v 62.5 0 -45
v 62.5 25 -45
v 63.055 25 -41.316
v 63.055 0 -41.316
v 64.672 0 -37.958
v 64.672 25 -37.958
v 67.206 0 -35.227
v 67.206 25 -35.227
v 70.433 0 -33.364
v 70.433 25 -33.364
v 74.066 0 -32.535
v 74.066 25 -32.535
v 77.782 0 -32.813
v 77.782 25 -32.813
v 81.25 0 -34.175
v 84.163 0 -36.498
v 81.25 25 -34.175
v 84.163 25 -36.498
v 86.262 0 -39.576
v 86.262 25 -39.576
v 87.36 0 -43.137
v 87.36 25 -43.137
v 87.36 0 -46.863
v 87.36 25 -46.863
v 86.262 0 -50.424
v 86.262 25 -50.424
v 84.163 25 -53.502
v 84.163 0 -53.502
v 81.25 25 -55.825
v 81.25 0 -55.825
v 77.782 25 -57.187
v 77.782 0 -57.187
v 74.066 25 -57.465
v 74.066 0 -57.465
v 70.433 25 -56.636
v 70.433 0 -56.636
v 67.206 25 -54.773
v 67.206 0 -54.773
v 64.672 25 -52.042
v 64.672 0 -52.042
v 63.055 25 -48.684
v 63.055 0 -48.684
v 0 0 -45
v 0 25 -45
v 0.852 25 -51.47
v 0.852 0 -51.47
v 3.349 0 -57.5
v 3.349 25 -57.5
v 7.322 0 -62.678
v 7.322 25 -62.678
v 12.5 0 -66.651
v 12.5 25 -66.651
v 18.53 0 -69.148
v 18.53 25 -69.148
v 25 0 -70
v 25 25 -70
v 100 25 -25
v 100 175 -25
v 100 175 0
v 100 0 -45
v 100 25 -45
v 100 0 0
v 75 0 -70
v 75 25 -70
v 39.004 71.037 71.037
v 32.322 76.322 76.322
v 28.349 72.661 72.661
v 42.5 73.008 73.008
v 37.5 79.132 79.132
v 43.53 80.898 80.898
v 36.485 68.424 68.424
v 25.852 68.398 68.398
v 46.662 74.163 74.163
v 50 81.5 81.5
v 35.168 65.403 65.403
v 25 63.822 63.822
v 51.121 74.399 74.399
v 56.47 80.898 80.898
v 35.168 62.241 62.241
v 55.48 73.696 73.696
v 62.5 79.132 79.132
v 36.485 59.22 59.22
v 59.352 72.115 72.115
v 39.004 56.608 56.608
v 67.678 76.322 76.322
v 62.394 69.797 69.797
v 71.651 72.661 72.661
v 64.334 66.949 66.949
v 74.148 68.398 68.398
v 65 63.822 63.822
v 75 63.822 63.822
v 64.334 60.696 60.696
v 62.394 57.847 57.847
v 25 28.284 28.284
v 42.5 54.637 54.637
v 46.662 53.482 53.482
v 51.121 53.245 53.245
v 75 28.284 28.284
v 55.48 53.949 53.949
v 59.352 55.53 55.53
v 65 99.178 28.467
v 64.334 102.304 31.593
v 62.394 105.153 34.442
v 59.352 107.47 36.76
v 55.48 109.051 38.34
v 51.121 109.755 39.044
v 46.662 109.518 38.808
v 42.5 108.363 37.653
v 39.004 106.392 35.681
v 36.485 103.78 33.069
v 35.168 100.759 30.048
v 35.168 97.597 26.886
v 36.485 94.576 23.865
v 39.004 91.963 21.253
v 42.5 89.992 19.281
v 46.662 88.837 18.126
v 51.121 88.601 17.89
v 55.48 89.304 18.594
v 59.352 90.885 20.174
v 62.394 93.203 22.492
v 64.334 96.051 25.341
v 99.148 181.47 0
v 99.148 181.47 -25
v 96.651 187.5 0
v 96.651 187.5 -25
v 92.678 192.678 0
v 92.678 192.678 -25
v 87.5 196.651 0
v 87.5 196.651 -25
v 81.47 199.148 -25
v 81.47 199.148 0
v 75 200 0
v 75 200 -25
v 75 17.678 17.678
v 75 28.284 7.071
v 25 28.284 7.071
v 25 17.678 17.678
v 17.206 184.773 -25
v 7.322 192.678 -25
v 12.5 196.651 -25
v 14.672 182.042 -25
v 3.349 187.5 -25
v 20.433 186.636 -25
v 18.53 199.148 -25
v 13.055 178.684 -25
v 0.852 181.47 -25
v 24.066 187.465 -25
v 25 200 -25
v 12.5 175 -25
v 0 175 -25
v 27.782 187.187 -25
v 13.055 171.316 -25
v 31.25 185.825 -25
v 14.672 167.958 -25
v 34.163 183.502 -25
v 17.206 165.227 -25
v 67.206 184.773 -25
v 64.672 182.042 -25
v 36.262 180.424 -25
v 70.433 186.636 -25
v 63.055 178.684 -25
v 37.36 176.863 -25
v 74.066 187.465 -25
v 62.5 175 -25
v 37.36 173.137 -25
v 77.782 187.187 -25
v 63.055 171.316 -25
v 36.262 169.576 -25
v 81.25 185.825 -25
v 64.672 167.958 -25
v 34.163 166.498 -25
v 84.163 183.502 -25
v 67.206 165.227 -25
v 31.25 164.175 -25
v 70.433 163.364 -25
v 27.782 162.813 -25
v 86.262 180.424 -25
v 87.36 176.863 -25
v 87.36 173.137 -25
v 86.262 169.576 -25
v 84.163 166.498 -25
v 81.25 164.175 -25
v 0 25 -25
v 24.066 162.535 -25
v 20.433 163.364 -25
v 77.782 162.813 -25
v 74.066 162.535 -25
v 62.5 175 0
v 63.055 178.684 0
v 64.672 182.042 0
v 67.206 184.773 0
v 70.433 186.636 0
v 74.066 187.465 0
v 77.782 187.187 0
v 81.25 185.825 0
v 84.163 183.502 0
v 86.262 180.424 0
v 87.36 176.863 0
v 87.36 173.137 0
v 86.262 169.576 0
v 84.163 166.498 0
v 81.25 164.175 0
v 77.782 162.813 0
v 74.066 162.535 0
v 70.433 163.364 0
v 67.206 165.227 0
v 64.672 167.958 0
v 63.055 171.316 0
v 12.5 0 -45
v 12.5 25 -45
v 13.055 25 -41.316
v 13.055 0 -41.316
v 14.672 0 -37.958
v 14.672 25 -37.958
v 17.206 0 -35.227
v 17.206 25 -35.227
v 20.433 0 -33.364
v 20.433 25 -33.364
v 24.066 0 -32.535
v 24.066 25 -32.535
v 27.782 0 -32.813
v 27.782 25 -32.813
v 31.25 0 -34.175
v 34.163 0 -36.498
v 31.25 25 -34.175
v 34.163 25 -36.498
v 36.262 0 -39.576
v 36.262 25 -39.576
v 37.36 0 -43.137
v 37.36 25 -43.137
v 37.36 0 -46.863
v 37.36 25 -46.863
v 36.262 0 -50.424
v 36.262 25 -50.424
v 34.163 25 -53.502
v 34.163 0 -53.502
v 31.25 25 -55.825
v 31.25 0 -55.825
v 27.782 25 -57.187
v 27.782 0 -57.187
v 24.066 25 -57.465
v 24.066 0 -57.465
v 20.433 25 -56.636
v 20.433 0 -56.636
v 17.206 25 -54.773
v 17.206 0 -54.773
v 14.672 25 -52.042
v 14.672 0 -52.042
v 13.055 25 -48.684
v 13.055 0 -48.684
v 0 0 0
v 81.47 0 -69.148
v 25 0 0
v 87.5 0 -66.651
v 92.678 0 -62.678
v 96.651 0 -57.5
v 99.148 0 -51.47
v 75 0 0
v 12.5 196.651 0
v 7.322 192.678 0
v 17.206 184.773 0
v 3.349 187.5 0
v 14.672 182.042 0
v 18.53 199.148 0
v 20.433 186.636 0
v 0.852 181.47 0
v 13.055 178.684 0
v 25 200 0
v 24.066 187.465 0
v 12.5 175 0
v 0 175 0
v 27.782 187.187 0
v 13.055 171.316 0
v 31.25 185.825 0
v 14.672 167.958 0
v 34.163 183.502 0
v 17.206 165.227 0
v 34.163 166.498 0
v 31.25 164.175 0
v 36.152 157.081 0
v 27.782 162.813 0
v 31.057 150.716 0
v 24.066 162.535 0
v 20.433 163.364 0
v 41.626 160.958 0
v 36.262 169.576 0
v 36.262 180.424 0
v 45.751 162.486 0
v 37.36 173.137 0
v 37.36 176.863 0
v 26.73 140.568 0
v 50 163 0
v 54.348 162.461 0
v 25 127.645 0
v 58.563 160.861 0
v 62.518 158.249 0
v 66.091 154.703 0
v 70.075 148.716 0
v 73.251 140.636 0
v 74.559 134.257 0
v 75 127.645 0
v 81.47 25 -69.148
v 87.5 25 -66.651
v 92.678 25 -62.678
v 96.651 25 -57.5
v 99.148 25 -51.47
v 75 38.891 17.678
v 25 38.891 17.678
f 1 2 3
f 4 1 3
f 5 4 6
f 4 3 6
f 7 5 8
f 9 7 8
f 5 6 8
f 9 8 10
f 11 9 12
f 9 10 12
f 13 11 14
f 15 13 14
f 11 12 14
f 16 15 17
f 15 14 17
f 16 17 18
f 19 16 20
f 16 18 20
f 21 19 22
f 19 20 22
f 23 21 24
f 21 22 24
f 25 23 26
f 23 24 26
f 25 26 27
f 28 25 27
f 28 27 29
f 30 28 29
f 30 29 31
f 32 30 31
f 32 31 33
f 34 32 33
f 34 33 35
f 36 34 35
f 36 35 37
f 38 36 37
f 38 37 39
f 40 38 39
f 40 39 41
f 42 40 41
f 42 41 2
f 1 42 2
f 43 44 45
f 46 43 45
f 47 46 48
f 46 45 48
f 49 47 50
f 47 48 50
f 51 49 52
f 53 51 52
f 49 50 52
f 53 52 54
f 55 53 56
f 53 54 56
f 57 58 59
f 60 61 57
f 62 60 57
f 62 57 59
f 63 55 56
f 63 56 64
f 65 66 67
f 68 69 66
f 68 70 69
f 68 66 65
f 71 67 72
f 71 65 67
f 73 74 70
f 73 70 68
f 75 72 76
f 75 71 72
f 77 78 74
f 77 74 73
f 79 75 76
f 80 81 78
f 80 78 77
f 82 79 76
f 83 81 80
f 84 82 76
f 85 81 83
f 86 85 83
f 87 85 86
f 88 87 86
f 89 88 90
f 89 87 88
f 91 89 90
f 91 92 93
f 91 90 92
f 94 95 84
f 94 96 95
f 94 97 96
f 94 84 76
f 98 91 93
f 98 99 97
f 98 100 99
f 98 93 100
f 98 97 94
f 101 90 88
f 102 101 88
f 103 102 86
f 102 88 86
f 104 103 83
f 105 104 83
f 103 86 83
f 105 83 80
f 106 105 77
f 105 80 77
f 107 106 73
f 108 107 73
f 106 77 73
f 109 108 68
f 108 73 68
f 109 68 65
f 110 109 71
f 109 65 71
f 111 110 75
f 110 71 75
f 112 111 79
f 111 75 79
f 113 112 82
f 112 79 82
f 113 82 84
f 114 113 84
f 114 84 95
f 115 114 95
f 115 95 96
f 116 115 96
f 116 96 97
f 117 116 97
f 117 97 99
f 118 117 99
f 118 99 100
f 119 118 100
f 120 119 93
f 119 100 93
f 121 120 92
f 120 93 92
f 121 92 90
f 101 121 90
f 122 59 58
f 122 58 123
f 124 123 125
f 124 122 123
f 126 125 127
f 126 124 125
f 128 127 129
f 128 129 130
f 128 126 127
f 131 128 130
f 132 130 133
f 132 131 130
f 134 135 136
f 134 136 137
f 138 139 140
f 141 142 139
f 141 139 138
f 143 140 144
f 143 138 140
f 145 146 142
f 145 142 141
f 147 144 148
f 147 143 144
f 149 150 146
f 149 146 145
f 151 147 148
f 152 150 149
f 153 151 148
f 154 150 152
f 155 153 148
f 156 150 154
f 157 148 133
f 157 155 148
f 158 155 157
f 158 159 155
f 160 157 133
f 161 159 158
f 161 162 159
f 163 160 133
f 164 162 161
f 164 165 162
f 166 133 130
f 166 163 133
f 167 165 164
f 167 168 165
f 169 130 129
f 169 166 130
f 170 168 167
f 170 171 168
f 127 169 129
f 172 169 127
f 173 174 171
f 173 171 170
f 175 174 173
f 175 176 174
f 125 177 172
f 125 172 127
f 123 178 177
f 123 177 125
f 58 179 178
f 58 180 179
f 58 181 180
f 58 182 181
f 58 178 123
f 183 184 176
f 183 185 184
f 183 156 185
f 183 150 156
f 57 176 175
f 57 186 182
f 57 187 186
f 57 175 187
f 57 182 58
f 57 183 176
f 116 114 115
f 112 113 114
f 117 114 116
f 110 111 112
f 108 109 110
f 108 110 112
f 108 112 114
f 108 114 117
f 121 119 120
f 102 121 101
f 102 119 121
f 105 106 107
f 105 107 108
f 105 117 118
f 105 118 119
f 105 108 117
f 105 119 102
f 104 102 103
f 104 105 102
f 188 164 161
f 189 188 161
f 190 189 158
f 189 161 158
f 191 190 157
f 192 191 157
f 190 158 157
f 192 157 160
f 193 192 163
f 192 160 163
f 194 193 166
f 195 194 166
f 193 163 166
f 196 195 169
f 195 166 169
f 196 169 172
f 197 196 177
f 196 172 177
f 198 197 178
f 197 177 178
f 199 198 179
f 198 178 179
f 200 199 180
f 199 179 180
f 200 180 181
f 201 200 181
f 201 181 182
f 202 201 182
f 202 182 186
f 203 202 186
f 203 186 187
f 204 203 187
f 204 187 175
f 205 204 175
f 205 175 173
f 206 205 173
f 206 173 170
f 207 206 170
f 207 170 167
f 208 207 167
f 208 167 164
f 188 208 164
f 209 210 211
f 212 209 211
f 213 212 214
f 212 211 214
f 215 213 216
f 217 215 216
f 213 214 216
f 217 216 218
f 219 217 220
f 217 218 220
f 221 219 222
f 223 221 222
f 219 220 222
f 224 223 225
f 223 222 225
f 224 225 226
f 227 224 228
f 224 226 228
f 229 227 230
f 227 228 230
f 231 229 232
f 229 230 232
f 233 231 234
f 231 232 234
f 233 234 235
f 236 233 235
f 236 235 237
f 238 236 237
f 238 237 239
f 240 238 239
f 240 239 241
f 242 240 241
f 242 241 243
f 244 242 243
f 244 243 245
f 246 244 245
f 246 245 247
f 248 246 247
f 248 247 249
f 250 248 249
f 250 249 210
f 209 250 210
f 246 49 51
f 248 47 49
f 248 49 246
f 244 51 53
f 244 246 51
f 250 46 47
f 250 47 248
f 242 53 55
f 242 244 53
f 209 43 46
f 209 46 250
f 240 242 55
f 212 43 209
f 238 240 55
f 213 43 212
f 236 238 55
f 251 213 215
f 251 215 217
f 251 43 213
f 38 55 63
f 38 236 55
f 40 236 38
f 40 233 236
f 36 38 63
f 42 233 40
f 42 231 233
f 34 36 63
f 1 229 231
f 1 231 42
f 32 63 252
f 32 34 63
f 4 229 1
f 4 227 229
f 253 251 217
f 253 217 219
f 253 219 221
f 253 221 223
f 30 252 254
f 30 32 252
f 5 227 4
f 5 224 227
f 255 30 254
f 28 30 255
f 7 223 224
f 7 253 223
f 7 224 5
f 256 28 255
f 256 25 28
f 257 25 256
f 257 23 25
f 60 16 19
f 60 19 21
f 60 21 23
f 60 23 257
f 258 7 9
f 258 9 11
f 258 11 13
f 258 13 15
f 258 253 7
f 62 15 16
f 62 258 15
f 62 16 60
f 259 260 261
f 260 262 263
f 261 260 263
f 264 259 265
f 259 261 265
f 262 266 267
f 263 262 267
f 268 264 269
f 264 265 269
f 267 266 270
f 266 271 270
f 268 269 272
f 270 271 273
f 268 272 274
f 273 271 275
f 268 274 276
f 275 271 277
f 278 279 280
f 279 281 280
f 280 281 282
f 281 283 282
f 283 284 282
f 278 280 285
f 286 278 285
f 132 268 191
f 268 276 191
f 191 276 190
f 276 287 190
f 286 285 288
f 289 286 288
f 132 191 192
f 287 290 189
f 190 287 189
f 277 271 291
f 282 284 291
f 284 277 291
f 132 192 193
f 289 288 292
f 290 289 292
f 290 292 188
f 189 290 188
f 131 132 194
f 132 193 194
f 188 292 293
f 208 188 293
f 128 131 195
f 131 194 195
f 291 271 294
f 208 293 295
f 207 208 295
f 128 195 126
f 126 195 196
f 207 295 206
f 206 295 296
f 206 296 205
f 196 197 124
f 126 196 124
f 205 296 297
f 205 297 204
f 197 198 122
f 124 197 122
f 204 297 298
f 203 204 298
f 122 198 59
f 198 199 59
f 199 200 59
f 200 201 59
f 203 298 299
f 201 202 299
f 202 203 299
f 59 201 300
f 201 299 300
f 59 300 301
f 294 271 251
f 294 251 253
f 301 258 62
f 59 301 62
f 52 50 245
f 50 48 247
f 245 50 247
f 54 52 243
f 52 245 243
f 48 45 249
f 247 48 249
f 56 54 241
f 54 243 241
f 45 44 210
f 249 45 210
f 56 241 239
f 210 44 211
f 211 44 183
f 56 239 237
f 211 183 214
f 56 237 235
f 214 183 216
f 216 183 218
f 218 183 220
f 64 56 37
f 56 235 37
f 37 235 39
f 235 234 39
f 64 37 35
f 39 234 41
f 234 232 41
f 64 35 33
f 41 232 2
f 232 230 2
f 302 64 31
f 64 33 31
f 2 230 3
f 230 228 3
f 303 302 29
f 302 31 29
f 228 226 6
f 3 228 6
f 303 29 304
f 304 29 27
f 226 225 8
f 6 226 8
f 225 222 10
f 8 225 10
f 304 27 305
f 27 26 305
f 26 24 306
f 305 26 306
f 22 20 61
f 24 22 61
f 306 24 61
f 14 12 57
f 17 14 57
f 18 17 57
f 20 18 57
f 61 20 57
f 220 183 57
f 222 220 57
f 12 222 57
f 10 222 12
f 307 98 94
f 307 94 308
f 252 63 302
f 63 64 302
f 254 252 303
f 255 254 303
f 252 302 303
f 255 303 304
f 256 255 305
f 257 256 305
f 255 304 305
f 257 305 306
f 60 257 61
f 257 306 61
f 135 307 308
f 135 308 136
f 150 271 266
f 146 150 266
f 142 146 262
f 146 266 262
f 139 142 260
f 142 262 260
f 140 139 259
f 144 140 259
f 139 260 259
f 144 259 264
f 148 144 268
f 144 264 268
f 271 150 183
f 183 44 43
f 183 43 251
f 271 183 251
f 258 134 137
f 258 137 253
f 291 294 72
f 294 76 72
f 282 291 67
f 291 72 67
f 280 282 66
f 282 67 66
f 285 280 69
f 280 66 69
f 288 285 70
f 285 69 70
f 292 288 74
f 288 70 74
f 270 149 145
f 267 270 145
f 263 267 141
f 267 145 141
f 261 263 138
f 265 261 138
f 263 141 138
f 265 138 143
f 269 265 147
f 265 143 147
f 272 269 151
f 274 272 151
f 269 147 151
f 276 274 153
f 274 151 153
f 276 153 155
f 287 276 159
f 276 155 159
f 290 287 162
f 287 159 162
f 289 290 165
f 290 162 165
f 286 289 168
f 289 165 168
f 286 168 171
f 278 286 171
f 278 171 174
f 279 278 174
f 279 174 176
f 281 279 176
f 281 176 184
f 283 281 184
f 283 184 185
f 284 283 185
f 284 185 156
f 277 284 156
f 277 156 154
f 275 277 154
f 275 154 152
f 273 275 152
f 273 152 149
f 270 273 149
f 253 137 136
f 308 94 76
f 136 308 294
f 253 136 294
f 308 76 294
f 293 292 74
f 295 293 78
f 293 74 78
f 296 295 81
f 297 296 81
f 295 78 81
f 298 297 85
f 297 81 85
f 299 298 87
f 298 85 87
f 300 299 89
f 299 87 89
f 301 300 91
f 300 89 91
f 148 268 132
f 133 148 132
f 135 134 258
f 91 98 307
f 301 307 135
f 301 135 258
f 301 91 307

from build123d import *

# Parameters (mm, degrees)
F0_W           = 100
F0_H           = 70
F1_DEPTH       = 200
F2_R           = 25
F3_T           = -25
F5_START       = -25
F5_DEPTH       = 50
F6_R           = 24.99999
F9_D           = 25
F9_DEPTH       = 100
F9_TIP         = 7.5107577378
F9_ON_F8_D     = 25
F9_ON_F8_DEPTH = 100
F9_ON_F8_TIP   = 7.5107577378
F10_R          = 15
F11_DEPTH      = 50


# Not quite as in the source:
# - a fillet or chamfer is up to 0.001 mm smaller than in the source, because OpenCascade refuses the exact size


with BuildPart() as f1:
    # F0 (on Front) → F1 (new body)
    with BuildSketch(Plane.XZ):
        with Locations((50, -35)):
            Rectangle(F0_W, F0_H)
    extrude(amount=-F1_DEPTH)

    # F2
    f2_edges = [f1.edges().sort_by_distance(p)[0] for p in [
        (100, 100, -70),
        (0, 100, -70),
        (100, 200, -35),
        (0, 200, -35),
    ]]
    fillet(f2_edges, radius=F2_R)

    # F3
    f3_openings = [f1.faces().sort_by_distance(p)[0] for p in [
        (100, 87.5, -22.5),
        (50, 200, -35),
        (92.67767, 192.67767, -35),
        (7.32233, 192.67767, -35),
        (0, 87.5, -22.5),
        (92.67767, 100, -62.67767),
        (50, 100, -70),
        (7.32233, 100, -62.67767),
    ]]
    offset(amount=F3_T, openings=f3_openings)

    # F4 (on face) → F5 (join)
    with BuildSketch(Plane.YZ.offset(100).offset(F5_START)):
        Polygon((17.6776695297, 17.6776695297), (0, 0), (163, 0), (81.5, 81.5), (28.2842712475, 28.2842712475), (38.8908729653, 17.6776695297), (28.2842712475, 7.0710678119), align=None)
    extrude(amount=-F5_DEPTH)

    # F6 (radius 25 in the source; OpenCascade refuses exactly that, so slightly less here)
    f6_edges = [f1.edges().sort_by_distance(p)[0] for p in [
        (75, 122.25, 40.75),
        (25, 122.25, 40.75),
    ]]
    fillet(f6_edges, radius=F6_R)

    # F9
    with Locations(Plane.XZ):
        with Locations((75, -45), (25, -45)):
            Hole(F9_D / 2, depth=F9_DEPTH)
            with Locations((0, 0, -(F9_DEPTH + F9_TIP / 2))):  # 118° drill point
                Cone(0, F9_D / 2, F9_TIP, mode=Mode.SUBTRACT)

    # F9 on F8
    with Locations(Plane.XY):
        with Locations((75, 175), (25, 175)):
            Hole(F9_ON_F8_D / 2, depth=F9_ON_F8_DEPTH)
            with Locations((0, 0, -(F9_ON_F8_DEPTH + F9_ON_F8_TIP / 2))):  # 118° drill point
                Cone(0, F9_ON_F8_D / 2, F9_ON_F8_TIP, mode=Mode.SUBTRACT)

    # F10 (on face) → F11 (cut)
    with BuildSketch(Plane(origin=(0, 0, 0), x_dir=(1, 0, 0), z_dir=(0, -0.7071067812, 0.7071067812))):
        with Locations((50, 90.2584053334)):
            Circle(F10_R)
    extrude(amount=-F11_DEPTH, mode=Mode.SUBTRACT)


solid = f1.part
